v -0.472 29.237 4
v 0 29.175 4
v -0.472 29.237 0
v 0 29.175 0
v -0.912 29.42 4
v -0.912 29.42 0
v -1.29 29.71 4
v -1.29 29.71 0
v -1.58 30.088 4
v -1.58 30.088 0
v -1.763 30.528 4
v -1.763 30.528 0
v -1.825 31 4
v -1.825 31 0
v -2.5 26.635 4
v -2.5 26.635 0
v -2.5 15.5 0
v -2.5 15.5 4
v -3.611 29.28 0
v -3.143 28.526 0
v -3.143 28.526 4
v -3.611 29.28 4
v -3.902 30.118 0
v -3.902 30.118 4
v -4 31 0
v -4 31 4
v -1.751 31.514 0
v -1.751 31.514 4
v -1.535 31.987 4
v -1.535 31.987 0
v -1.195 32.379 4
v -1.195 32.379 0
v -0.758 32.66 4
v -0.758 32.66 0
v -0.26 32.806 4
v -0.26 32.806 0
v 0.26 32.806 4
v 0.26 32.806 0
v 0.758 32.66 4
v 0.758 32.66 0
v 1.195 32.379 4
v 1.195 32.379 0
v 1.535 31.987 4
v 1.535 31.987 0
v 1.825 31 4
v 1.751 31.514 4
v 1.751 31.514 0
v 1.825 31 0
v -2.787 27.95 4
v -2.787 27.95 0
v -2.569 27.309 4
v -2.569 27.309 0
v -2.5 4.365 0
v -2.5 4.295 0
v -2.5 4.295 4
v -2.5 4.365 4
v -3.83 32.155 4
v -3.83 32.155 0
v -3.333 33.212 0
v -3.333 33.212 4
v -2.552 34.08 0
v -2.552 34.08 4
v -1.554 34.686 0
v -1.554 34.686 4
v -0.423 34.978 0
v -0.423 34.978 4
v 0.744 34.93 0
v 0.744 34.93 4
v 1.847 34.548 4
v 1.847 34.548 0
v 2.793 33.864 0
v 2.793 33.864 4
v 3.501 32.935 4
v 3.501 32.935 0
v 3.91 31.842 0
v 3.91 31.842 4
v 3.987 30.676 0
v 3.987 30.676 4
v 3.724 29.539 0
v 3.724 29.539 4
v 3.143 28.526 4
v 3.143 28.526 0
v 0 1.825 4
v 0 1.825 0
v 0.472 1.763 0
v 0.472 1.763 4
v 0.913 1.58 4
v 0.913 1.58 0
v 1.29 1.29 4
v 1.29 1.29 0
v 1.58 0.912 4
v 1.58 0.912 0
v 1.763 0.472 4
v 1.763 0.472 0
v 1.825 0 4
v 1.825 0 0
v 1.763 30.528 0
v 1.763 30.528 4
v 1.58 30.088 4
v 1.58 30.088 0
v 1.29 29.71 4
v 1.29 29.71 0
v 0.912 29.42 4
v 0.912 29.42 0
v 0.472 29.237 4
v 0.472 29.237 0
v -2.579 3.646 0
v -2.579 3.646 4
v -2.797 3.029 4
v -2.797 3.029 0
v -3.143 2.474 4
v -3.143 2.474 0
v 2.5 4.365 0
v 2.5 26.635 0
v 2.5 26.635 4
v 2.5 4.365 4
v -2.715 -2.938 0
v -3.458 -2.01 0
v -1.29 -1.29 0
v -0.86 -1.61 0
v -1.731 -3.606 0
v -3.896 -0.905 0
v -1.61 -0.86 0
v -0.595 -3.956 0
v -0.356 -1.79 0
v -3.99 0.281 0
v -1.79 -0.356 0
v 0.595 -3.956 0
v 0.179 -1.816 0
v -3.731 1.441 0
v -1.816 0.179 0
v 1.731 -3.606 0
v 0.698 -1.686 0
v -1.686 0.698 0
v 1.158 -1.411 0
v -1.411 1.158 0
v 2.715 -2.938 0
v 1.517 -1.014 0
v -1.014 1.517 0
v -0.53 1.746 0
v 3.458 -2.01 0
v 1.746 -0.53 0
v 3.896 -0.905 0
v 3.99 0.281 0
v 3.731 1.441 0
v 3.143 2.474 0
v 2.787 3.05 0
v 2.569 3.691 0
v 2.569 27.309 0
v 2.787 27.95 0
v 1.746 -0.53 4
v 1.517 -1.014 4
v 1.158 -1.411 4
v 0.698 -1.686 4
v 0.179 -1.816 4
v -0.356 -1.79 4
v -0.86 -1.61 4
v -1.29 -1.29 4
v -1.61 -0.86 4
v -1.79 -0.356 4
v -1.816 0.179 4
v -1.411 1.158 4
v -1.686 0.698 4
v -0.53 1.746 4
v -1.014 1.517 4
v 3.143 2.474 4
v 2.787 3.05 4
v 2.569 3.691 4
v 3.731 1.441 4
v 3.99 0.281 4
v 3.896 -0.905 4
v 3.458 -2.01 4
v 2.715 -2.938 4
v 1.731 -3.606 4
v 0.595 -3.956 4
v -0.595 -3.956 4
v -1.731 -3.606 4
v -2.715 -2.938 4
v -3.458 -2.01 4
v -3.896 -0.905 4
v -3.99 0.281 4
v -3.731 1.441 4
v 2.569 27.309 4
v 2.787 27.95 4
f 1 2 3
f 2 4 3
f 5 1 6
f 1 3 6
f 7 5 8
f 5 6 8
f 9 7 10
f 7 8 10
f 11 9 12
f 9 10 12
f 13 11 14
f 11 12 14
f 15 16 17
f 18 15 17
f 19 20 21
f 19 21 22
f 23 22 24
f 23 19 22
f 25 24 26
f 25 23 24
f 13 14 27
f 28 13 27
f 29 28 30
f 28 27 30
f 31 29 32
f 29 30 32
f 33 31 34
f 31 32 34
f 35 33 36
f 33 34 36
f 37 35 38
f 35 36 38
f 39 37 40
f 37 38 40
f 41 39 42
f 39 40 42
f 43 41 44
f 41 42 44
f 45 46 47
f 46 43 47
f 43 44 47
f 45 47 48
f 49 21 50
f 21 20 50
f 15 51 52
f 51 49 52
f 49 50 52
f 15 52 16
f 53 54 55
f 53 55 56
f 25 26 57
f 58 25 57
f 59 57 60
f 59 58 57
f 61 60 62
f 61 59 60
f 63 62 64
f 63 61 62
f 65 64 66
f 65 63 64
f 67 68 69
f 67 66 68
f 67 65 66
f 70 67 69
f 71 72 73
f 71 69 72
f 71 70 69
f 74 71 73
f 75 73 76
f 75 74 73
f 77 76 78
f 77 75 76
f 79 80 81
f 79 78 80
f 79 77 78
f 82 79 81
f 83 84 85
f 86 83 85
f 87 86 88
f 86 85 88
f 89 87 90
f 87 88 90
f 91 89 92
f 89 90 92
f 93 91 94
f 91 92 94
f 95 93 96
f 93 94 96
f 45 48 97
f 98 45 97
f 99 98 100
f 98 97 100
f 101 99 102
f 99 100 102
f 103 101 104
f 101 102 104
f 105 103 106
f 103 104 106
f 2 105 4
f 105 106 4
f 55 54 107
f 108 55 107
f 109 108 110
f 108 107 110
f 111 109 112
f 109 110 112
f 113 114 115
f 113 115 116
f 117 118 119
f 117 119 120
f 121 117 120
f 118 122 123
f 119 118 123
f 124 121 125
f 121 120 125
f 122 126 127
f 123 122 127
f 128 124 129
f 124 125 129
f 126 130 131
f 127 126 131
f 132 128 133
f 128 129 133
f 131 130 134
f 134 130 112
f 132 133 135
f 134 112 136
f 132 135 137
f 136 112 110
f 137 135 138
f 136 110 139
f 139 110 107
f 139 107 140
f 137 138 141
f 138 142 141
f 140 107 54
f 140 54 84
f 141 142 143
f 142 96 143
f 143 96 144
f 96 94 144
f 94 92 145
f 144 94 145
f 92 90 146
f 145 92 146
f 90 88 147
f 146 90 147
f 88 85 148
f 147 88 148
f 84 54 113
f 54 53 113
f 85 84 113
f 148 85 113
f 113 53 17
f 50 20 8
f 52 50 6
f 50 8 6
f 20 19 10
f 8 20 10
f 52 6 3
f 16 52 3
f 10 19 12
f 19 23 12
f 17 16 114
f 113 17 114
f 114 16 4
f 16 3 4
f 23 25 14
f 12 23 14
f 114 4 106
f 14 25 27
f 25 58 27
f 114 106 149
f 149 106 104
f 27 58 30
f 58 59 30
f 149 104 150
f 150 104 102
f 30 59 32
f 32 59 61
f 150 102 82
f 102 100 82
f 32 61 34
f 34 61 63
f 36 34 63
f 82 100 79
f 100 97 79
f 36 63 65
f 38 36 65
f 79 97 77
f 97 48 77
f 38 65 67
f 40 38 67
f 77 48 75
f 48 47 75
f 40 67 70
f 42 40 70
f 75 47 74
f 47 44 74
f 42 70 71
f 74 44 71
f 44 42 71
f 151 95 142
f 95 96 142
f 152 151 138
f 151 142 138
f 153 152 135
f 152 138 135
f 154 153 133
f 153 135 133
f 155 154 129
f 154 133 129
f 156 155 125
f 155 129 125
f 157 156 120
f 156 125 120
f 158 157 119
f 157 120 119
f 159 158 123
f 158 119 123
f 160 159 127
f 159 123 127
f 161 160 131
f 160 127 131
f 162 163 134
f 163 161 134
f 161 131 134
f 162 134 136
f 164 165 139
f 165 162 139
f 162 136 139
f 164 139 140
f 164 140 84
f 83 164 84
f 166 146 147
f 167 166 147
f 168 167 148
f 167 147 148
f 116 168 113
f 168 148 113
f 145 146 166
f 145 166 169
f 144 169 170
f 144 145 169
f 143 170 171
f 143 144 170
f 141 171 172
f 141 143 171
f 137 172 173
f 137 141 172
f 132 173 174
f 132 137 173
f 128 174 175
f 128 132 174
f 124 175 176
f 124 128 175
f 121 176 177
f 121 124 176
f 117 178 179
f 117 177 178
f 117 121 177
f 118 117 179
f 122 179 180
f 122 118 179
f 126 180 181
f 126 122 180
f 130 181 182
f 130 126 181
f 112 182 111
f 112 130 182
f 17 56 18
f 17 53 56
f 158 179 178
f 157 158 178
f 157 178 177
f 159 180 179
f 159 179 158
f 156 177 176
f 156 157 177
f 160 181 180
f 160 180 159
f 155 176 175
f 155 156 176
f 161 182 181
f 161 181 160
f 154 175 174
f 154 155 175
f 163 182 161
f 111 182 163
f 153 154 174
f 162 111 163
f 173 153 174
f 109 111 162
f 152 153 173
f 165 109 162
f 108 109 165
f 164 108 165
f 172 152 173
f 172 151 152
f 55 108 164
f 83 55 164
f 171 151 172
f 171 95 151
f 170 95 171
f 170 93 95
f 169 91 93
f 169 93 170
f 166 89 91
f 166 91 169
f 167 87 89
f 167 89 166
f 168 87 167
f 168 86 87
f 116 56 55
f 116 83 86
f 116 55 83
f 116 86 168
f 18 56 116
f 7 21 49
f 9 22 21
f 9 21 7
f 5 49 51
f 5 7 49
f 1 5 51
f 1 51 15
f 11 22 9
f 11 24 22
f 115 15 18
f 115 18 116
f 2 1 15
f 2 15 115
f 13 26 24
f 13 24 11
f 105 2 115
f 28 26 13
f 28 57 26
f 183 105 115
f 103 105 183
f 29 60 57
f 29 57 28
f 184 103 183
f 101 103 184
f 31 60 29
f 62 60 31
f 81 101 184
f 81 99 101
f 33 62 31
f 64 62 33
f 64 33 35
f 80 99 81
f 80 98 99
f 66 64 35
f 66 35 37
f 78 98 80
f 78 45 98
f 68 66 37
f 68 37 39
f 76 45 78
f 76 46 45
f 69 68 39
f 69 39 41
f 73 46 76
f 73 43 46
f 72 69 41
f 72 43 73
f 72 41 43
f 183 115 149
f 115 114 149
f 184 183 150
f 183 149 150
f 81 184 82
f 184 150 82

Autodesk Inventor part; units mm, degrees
ref_plane "YZ Plane" through (0, 0, 0) normal (1, 0, 0) x (0, 1, 0)
ref_plane "XZ Plane" through (0, 0, 0) normal (0, 1, 0) x (-1, 0, 0)
ref_plane "XY Plane" through (0, 0, 0) normal (0, 0, 1) x (1, 0, 0)
sketch "Náčrt1" plane through (0, 0, 0) normal (0, 0, 1) x (1, 0, 0)
  line L0 (0, 0) -> (0, 31)
  circle A0 centre (0, 31) radius 1.825
  circle A1 centre (0, 0) radius 1.825
  arc A2 (3.1429, 28.5257) -> (-3.1429, 28.5257) centre (0, 31) ccw
  arc A3 (-3.1429, 2.4743) -> (3.1429, 2.4743) centre (0, 0) ccw
  line L1 (0, 31) -> (-5.5, 31)
  line L2 (-5.5, 31) -> (-5.5, 26.67)
  arc A4 (-2.5003, 26.6349) -> (-3.1429, 28.5257) centre (-5.5, 26.67) ccw
  line L3 (-2.5003, 4.2949) -> (-2.5003, 15.5)
  arc A5 (3.1429, 28.5257) -> (2.5003, 26.6349) centre (5.5, 26.67) ccw
  arc A6 (-3.1429, 2.4743) -> (-2.5003, 4.3651) centre (-5.5, 4.33) ccw
  arc A7 (2.5003, 4.3651) -> (3.1429, 2.4743) centre (5.5, 4.33) ccw
  line L4 (2.5003, 26.6349) -> (2.5003, 4.3651)
  line L5 (-2.5003, 26.6349) -> (-2.5003, 15.5)
  dimension "d0" = 31
  dimension "d1" = 3.65
  dimension "d2" = 3.65
  dimension "d3" = 8
  dimension "d4" = 8
  dimension "d7" = 5.5
  dimension "d8" = 4.33
extrude "Vysunutí1" add sketch "Náčrt1" along normal blind 4
properties part number "spojka" material "ABS Plastic"
